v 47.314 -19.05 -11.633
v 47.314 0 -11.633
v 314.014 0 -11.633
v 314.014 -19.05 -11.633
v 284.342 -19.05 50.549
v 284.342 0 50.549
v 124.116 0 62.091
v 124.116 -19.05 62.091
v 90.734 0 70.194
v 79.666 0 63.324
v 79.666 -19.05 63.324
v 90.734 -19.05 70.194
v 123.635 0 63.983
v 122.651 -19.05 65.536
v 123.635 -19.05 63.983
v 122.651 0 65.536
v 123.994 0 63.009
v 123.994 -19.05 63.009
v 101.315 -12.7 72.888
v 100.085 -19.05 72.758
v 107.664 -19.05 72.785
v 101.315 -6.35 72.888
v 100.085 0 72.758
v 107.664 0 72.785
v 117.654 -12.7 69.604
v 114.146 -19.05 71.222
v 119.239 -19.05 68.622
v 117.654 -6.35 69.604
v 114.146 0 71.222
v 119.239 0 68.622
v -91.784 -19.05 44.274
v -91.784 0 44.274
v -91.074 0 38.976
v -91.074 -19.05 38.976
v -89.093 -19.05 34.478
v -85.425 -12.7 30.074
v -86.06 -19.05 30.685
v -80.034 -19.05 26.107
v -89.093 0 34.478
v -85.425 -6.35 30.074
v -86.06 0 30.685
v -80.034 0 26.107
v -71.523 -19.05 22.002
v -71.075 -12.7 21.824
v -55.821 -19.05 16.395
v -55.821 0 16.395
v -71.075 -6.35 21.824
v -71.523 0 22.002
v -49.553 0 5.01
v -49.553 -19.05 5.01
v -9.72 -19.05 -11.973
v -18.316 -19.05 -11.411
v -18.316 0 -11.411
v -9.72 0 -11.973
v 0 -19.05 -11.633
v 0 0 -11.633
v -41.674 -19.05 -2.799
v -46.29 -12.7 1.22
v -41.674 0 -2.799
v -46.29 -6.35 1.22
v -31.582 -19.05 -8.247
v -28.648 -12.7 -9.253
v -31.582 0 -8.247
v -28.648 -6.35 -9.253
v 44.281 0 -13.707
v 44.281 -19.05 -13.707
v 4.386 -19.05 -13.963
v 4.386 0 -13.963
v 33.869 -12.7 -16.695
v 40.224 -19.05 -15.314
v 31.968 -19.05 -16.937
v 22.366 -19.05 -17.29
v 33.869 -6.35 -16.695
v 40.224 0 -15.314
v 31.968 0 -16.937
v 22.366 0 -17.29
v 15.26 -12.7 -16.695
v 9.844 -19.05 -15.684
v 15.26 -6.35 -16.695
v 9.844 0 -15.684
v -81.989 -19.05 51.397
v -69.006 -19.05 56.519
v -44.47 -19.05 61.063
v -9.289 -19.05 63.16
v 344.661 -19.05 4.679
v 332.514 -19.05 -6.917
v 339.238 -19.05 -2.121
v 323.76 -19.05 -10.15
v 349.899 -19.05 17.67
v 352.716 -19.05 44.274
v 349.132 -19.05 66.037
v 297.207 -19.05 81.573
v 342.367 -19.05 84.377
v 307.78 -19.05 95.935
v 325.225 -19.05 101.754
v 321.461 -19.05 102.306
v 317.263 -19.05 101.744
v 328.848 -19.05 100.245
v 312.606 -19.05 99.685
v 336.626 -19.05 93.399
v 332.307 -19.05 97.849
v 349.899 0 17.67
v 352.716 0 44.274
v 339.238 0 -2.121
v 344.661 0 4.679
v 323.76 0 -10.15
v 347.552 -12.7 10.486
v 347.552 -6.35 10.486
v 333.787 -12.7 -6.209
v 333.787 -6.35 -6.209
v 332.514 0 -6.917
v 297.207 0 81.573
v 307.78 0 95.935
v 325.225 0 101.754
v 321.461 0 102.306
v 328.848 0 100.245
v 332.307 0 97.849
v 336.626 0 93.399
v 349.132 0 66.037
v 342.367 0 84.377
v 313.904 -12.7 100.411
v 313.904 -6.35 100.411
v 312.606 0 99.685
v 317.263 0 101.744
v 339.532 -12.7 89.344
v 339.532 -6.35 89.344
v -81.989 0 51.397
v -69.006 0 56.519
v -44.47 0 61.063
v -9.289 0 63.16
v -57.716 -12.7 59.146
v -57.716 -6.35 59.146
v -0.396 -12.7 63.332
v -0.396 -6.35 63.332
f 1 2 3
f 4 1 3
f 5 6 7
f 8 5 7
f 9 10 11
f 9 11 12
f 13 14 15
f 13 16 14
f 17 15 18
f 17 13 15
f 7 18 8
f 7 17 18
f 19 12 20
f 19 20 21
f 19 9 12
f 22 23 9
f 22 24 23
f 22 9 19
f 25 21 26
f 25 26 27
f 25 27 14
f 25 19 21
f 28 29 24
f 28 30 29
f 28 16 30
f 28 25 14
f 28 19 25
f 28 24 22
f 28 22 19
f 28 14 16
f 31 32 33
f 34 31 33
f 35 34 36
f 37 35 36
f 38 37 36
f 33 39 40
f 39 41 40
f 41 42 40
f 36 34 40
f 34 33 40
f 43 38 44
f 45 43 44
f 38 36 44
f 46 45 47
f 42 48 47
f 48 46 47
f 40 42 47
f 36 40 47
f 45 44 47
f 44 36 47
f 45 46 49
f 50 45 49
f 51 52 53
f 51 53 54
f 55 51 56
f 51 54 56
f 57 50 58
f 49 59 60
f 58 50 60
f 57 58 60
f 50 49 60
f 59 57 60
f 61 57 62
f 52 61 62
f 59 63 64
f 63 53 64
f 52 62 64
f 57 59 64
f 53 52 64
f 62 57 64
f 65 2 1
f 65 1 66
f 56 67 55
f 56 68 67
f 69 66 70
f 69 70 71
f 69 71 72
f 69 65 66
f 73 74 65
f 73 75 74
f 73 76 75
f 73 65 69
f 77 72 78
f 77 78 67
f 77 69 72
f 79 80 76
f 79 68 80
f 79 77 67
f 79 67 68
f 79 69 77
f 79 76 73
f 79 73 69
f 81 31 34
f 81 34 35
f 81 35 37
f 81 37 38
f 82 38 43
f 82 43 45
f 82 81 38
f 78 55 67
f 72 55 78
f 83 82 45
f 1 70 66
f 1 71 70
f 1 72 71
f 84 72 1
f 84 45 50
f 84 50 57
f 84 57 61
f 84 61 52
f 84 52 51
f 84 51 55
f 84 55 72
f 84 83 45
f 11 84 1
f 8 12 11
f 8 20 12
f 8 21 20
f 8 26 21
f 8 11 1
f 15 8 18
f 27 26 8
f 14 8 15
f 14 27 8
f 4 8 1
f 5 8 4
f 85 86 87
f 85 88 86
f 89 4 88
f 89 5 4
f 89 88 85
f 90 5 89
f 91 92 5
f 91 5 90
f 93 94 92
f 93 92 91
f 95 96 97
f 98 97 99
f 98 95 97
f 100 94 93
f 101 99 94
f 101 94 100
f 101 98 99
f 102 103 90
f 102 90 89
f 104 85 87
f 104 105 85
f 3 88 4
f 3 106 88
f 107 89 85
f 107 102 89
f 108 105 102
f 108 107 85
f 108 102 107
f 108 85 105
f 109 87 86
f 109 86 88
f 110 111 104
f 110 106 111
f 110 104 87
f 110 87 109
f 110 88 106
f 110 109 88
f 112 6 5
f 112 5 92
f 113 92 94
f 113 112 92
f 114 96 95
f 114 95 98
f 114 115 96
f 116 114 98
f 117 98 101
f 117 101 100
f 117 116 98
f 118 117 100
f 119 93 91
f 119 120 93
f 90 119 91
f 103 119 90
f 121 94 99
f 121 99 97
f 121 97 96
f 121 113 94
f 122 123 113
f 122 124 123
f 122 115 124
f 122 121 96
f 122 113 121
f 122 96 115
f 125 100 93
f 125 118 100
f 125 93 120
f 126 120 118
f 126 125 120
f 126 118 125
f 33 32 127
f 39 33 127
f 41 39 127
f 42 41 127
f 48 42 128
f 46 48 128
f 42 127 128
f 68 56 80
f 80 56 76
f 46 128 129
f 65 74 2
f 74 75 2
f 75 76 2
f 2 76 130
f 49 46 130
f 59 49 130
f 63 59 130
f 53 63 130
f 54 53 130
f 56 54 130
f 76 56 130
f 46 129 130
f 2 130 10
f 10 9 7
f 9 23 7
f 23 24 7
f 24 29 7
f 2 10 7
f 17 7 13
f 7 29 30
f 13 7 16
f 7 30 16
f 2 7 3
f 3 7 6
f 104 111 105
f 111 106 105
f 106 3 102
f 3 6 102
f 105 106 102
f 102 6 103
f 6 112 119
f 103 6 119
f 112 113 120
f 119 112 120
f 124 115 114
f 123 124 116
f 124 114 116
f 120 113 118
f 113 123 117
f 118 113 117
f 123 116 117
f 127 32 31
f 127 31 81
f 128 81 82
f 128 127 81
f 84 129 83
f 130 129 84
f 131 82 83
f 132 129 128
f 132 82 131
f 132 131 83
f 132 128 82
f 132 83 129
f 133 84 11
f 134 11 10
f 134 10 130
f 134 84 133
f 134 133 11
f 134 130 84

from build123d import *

# Parameters (mm, degrees)
F1_DEPTH = 19.05


with BuildPart() as f1:
    # F0 (on Front) → F1 (new body)
    with BuildSketch(Plane.XZ):
        with BuildLine():
            Line((47.313681, -11.632638), (314.013681, -11.632638))
            add(Edge.make_bspline(
                [(352.715969, 44.274099), (352.715969, 0), (335.928053, -9.905117), (314.013681, -11.632638)],
                knots=[0, 0, 0, 0, 67.995811, 67.995811, 67.995811, 67.995811], degree=3))
            add(Edge.make_bspline(
                [(284.34224, 50.548841), (313.035429, 139.851982), (348.589689, 97.368889), (352.715969, 44.274099)],
                knots=[0, 0, 0, 0, 68.661046, 68.661046, 68.661046, 68.661046], degree=3))
            Line((284.34224, 50.548841), (124.115969, 62.091228))
            add(Edge.make_bspline(
                [(79.665969, 63.324099), (102.446698, 82.186237), (124.115969, 68.843909), (124.115969, 62.091228)],
                knots=[0, 0, 0, 0, 44.467094, 44.467094, 44.467094, 44.467094], degree=3))
            add(Edge.make_bspline(
                [(-91.784031, 44.274099), (-69.512811, 66.651346), (-11.597474, 63.266684), (79.665969, 63.324099)],
                knots=[0, 0, 0, 0, 172.505087, 172.505087, 172.505087, 172.505087], degree=3))
            add(Edge.make_bspline(
                [(-91.784031, 44.274099), (-91.784031, 26.056429), (-69.163285, 21.455625), (-55.820961, 16.394742)],
                knots=[0, 0, 0, 0, 45.503857, 45.503857, 45.503857, 45.503857], degree=3))
            add(Edge.make_bspline(
                [(-55.820961, 16.394742), (-49.379837, 0), (-35.117339, -14.430643), (0, -11.632638)],
                knots=[0, 0, 0, 0, 62.462098, 62.462098, 62.462098, 62.462098], degree=3))
            add(Edge.make_bspline(
                [(47.313681, -11.632638), (39.288981, -19.225901), (10.748499, -19.225901), (0, -11.632638)],
                knots=[0, 0, 0, 0, 47.313681, 47.313681, 47.313681, 47.313681], degree=3))
        make_face()
    extrude(amount=F1_DEPTH)


solid = f1.part
